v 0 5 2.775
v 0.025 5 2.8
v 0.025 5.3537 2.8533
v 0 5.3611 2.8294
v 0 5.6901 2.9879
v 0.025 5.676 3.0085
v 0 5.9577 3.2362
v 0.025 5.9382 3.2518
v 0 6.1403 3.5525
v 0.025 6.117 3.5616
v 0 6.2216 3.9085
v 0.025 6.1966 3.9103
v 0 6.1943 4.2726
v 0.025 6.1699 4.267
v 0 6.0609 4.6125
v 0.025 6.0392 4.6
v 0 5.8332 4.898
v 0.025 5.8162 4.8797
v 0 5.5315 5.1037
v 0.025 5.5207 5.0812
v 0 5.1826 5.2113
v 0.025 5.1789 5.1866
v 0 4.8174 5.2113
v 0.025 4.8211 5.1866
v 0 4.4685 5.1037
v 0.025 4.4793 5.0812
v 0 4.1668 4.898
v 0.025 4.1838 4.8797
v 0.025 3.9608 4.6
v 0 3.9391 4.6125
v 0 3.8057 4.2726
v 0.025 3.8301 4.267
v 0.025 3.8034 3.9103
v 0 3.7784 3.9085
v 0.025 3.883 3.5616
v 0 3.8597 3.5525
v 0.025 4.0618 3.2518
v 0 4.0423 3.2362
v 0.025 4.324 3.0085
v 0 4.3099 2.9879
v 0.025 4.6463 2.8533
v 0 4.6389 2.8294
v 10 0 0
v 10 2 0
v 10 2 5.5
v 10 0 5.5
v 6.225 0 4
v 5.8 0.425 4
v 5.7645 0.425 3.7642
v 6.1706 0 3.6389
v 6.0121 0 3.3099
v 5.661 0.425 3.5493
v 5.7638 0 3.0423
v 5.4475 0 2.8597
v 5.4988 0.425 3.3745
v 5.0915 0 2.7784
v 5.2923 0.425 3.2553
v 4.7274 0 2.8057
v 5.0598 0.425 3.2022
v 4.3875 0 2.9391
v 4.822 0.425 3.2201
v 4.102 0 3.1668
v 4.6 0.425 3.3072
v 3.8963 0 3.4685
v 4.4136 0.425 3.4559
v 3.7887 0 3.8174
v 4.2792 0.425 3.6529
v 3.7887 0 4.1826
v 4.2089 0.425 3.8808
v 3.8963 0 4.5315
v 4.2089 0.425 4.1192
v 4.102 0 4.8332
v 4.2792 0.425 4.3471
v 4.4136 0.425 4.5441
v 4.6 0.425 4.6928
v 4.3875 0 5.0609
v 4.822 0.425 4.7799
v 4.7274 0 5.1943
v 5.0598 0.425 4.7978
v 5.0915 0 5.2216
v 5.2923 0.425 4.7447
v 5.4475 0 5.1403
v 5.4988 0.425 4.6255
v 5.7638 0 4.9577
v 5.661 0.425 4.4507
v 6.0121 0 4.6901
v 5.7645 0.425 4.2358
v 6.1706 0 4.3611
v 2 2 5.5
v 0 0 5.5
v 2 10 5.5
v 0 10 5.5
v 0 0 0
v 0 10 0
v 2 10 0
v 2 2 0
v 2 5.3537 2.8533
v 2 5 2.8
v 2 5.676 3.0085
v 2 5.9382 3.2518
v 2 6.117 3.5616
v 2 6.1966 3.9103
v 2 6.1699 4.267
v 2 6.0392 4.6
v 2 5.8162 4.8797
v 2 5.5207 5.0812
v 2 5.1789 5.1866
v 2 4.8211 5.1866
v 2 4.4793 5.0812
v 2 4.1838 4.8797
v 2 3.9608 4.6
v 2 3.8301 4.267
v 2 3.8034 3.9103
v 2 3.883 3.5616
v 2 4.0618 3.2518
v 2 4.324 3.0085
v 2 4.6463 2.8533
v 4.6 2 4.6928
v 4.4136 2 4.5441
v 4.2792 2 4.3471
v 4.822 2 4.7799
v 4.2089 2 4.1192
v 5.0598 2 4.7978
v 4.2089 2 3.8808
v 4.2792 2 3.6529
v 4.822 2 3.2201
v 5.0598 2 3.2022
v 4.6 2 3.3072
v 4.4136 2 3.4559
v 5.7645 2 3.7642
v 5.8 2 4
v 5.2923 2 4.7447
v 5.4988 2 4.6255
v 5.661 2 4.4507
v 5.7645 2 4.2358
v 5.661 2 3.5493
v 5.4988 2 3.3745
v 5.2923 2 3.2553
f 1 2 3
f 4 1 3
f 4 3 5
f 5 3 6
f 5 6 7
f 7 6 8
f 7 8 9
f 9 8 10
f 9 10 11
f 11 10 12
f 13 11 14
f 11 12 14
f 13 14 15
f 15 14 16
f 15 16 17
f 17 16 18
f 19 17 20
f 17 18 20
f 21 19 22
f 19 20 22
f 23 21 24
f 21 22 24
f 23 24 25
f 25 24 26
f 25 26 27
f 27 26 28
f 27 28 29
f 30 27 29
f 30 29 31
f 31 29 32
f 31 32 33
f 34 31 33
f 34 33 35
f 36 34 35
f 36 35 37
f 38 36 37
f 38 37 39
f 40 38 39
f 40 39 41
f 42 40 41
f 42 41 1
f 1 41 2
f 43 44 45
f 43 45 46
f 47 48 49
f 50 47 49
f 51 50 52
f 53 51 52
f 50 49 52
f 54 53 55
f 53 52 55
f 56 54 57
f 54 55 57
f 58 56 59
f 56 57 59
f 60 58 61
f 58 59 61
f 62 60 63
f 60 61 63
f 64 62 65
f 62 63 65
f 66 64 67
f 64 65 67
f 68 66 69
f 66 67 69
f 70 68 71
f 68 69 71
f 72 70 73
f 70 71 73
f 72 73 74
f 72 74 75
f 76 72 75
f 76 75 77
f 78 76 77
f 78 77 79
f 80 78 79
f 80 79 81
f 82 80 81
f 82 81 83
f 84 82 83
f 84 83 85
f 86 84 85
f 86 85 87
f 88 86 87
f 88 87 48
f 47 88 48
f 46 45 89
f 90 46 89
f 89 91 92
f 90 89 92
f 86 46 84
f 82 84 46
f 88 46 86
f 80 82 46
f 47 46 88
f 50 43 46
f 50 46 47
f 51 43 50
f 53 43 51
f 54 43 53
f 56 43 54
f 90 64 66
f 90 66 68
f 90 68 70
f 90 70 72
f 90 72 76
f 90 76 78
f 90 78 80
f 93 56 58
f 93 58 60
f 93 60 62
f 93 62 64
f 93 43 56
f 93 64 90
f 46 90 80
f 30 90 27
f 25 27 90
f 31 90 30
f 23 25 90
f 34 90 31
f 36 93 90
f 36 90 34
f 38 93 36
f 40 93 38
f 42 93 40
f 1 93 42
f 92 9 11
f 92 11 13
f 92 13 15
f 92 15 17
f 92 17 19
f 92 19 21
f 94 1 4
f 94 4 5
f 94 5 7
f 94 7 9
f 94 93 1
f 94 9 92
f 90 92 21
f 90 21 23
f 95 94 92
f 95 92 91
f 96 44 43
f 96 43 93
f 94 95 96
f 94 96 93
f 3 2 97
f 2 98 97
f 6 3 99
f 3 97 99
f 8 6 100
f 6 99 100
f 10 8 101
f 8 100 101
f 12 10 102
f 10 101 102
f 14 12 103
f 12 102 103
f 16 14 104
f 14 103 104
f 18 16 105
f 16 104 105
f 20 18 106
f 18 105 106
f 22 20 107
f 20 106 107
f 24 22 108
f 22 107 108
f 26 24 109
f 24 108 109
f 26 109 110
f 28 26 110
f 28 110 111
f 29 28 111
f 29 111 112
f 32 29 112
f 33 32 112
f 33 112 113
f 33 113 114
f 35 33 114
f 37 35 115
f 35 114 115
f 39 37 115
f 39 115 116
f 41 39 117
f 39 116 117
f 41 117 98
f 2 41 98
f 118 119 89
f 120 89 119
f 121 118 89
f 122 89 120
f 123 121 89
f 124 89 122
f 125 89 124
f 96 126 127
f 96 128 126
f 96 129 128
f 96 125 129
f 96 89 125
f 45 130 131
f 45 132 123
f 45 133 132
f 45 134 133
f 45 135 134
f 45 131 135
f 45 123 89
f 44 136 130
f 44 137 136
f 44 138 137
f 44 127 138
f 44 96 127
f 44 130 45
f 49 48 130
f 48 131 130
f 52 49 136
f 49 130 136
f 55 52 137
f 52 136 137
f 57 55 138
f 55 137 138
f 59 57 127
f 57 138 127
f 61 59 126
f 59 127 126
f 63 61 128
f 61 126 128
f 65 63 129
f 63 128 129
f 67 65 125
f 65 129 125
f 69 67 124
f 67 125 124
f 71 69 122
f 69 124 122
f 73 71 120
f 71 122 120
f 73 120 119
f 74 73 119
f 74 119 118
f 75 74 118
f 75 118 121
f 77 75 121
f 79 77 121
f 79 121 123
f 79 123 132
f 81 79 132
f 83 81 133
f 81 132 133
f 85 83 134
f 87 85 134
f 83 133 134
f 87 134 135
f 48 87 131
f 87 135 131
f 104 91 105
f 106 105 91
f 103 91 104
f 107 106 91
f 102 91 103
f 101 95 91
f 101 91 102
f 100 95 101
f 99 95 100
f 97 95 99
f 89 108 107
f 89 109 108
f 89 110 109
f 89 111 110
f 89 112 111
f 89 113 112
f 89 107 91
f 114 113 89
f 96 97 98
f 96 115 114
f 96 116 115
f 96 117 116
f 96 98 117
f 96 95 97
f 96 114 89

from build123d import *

# Parameters (mm, degrees)
BOSS_EXTRUDE1_DEPTH             = 5.5
M2_CLEARANCE_HOLE1_D            = 2.4
M2_CLEARANCE_HOLE1_CSINK_D      = 2.45
M2_CLEARANCE_HOLE1_CSINK_ANGLE  = 90
M2X0_4_TAPPED_HOLE1_D           = 1.6
M2X0_4_TAPPED_HOLE1_CSINK_D     = 2.45
M2X0_4_TAPPED_HOLE1_CSINK_ANGLE = 90


with BuildPart() as part:
    # Sketch1 → Boss-Extrude1 (new body)
    with BuildSketch(Plane.XY):
        Polygon((0, 0), (0, 10), (2, 10), (2, 2), (10, 2), (10, 0), align=None)
    extrude(amount=BOSS_EXTRUDE1_DEPTH)

    # M2 Clearance Hole1 (through all)
    with Locations(Plane.ZY):
        with Locations((4, 5)):
            CounterSinkHole(M2_CLEARANCE_HOLE1_D / 2, M2_CLEARANCE_HOLE1_CSINK_D / 2, counter_sink_angle=M2_CLEARANCE_HOLE1_CSINK_ANGLE)

    # M2x0.4 Tapped Hole1 (through all)
    with Locations(Plane(origin=(0, 0, 0), x_dir=(-1, 0, 0), z_dir=(0, -1, 0))):
        with Locations((-5, -4)):
            CounterSinkHole(M2X0_4_TAPPED_HOLE1_D / 2, M2X0_4_TAPPED_HOLE1_CSINK_D / 2, counter_sink_angle=M2X0_4_TAPPED_HOLE1_CSINK_ANGLE)


solid = part.part
